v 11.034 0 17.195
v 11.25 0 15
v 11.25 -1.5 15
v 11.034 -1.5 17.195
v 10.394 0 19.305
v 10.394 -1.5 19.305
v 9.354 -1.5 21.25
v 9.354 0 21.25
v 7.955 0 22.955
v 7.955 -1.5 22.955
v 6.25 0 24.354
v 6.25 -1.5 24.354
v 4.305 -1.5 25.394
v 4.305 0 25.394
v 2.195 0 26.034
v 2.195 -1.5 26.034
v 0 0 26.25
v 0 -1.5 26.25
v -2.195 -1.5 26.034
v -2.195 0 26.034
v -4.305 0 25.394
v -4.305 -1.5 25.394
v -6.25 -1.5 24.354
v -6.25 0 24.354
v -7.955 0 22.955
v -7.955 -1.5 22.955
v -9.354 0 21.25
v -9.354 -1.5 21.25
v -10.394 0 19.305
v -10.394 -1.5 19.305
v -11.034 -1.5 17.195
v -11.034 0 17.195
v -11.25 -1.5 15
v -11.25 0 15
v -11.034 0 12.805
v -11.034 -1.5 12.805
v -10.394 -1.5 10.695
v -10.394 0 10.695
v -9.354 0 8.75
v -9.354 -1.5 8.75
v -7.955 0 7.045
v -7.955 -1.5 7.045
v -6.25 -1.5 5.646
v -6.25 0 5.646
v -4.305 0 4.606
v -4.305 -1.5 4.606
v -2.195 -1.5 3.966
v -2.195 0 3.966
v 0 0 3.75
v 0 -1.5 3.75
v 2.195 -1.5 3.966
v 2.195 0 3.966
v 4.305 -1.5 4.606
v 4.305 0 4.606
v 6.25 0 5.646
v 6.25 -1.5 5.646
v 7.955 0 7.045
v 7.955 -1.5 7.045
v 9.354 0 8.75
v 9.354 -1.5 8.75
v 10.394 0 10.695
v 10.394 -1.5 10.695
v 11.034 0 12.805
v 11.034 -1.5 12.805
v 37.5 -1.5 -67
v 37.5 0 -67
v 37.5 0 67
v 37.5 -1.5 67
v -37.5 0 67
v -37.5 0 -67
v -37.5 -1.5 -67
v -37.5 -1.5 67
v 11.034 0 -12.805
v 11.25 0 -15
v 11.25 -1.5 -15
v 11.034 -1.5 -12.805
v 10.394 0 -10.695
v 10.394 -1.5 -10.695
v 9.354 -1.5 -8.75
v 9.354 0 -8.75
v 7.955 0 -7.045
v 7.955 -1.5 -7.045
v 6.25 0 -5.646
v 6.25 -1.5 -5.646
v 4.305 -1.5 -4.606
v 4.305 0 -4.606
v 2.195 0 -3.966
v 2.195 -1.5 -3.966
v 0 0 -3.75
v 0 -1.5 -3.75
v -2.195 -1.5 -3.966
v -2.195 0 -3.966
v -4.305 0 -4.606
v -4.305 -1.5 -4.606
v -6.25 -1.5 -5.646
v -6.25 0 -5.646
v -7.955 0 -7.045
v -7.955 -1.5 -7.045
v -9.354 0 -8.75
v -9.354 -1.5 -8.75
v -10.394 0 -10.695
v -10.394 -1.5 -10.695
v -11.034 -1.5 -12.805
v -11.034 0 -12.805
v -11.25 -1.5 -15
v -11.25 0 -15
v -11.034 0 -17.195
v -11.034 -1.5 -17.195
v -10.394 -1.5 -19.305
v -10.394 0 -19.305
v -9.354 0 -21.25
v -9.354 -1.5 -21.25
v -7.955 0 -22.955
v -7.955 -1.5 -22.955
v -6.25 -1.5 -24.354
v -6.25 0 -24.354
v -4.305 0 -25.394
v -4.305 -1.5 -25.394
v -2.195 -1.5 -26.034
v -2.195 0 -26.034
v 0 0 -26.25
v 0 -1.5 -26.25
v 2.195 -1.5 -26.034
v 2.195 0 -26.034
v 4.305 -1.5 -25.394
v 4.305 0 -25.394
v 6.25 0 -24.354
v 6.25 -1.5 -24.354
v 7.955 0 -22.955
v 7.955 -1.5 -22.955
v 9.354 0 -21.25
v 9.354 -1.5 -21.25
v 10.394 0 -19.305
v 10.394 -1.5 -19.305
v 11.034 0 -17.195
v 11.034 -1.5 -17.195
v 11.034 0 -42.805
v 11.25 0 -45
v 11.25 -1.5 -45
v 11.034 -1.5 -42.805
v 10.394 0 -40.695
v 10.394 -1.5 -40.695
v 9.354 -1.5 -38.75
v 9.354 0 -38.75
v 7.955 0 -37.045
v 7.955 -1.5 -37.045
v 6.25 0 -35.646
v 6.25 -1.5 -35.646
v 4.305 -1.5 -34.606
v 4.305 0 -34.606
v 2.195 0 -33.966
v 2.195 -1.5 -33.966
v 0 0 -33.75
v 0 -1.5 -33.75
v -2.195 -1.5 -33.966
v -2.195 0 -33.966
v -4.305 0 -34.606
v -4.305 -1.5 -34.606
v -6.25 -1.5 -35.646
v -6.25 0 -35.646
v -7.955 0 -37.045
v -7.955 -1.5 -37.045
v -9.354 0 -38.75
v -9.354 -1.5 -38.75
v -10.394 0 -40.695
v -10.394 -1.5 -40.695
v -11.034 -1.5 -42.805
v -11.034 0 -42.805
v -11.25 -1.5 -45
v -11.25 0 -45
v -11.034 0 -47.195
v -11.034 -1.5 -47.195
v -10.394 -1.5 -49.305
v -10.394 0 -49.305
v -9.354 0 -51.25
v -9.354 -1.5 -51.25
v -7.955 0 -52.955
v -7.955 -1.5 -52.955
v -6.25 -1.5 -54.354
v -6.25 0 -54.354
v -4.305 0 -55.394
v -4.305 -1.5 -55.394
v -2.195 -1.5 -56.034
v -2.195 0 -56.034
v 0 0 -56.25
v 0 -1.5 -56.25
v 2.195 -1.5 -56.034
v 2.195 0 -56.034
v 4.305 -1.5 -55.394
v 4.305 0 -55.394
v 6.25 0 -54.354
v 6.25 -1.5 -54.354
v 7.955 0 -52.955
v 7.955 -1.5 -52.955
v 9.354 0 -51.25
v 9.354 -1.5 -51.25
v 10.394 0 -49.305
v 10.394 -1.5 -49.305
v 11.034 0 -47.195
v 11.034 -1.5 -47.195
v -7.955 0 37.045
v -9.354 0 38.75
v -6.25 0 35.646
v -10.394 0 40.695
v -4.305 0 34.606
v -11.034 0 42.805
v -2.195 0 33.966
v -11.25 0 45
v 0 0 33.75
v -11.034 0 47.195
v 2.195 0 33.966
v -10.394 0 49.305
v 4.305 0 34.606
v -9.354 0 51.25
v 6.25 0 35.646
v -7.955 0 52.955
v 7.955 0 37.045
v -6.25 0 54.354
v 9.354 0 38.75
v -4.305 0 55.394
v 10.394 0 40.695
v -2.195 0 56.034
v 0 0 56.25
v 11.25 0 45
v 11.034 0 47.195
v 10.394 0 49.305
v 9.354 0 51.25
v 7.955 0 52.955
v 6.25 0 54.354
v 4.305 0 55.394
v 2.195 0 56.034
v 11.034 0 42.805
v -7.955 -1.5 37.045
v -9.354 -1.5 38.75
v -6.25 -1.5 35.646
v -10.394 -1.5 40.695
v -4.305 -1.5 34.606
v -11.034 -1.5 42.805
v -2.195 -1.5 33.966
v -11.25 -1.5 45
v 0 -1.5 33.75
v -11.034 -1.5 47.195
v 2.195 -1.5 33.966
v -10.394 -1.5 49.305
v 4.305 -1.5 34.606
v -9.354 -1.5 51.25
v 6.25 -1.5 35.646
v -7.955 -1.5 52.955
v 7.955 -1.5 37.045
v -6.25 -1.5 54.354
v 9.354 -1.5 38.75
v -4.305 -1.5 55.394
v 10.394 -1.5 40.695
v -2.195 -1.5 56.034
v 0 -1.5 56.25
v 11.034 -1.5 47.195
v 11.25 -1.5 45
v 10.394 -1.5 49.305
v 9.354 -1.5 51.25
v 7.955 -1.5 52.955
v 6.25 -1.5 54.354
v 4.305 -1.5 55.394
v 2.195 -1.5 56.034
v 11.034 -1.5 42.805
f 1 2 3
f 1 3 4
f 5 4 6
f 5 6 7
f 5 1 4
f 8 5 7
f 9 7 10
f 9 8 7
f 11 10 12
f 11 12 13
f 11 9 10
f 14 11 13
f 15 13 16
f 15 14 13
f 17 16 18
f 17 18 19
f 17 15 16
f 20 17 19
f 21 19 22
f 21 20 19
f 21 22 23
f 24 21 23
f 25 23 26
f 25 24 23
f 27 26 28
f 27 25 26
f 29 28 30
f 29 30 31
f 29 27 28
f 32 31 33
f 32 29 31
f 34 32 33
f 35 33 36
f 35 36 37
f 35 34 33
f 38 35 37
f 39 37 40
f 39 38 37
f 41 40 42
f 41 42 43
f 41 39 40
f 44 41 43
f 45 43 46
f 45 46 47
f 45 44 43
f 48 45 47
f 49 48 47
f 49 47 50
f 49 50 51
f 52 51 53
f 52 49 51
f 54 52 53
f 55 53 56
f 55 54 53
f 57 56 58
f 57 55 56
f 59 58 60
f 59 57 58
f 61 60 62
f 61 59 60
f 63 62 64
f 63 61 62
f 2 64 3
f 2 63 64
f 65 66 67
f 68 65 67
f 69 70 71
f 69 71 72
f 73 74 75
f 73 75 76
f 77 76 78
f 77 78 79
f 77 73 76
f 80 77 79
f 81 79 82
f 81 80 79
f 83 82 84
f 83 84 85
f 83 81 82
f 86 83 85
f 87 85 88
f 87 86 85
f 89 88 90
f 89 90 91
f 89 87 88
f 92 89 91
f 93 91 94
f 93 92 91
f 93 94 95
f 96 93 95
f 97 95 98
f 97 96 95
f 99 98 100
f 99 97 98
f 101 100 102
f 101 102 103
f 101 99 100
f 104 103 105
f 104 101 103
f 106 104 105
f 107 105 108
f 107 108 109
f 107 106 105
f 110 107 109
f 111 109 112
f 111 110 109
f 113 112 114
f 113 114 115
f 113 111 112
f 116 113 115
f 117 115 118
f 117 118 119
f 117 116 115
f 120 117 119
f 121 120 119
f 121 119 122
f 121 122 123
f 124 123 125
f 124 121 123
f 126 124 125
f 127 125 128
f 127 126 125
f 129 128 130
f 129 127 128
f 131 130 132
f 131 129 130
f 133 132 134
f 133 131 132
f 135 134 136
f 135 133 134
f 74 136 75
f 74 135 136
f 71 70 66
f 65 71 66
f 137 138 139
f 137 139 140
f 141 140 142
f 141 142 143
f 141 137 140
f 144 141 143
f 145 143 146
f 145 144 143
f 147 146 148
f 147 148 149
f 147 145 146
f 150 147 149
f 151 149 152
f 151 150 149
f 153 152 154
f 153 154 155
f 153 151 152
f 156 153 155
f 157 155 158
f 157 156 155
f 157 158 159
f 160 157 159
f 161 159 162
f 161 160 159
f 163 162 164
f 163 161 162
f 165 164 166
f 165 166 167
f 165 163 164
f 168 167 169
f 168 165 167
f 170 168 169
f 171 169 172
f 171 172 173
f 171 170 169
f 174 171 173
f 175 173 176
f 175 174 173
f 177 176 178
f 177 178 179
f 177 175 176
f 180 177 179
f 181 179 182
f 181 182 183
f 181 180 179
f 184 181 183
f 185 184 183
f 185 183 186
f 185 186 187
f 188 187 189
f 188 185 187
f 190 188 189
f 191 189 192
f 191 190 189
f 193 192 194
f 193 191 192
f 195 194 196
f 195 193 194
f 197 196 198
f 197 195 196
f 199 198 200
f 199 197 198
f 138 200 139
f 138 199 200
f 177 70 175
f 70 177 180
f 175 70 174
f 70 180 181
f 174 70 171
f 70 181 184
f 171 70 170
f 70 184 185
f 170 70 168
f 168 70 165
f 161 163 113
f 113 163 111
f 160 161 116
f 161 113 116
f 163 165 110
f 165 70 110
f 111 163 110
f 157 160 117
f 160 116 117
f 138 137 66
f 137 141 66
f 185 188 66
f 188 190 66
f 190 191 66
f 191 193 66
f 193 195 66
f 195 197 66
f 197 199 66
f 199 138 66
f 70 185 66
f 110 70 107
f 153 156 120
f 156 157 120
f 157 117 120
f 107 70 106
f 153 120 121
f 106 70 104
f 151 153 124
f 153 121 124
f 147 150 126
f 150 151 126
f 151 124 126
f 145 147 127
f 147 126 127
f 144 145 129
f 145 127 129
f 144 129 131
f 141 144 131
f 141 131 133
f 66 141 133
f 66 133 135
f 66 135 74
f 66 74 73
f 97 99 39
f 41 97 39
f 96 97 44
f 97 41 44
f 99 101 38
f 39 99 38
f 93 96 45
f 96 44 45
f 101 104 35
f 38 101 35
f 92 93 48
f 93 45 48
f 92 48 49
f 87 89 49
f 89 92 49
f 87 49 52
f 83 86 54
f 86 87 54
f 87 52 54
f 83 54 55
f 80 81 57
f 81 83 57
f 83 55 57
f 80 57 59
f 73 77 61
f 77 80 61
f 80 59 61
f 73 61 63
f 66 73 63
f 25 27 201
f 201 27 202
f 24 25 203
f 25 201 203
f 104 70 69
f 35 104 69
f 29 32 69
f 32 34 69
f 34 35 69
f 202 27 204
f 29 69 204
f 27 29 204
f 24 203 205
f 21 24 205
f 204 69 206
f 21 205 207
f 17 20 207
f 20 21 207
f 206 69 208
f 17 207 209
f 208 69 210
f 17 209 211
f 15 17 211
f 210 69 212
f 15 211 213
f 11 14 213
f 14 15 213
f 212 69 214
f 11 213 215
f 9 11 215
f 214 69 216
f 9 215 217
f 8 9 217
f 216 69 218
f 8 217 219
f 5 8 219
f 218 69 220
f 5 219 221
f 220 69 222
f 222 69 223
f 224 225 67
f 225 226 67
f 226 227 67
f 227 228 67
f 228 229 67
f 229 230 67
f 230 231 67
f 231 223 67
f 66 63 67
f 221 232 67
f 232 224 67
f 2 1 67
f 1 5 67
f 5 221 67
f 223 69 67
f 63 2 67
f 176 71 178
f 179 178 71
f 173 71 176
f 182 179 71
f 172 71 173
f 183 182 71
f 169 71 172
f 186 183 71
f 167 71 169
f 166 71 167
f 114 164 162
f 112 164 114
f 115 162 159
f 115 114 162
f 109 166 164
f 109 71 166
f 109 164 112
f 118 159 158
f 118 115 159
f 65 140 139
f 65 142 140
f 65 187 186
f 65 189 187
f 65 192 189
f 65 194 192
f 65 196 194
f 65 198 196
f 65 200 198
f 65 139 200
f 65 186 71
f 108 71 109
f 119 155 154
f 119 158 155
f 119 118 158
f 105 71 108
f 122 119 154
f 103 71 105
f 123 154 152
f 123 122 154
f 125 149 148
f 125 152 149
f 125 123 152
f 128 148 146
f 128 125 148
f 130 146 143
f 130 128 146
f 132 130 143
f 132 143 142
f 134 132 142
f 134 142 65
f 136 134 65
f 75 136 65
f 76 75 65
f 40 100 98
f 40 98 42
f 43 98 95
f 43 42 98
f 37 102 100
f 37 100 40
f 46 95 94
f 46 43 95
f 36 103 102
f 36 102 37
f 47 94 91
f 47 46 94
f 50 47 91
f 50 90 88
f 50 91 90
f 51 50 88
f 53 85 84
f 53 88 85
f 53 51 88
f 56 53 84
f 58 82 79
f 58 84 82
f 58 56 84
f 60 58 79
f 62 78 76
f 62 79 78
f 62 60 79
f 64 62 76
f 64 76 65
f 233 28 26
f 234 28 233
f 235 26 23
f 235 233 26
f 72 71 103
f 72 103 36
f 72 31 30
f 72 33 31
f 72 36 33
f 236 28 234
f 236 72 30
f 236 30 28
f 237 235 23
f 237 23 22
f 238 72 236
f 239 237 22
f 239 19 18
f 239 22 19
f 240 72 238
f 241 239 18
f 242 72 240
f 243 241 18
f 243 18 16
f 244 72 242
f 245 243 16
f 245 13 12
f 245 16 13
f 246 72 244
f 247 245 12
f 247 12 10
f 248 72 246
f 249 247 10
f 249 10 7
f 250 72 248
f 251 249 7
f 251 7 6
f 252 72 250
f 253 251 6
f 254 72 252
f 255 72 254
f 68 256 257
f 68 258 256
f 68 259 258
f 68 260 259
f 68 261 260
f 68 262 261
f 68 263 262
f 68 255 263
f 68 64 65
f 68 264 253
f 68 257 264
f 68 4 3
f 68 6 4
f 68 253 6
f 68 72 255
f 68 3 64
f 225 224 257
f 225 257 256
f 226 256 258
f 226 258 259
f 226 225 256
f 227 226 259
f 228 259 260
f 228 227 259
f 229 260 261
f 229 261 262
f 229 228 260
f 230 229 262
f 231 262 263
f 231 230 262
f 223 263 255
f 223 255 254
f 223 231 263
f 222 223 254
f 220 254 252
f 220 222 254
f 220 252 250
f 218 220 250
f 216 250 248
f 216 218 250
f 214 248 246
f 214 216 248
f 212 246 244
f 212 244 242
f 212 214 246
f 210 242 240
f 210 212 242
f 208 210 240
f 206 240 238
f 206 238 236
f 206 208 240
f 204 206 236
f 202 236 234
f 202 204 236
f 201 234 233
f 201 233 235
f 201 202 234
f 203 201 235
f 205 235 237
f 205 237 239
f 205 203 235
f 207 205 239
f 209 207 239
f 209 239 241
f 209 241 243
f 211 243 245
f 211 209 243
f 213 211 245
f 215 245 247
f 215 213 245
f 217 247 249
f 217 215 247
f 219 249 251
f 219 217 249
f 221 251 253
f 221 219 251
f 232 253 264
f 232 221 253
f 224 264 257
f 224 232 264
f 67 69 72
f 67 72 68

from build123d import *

# Parameters (mm, degrees)
F0_W     = 75
F0_H     = 134
F0_R     = 11.25
F1_DEPTH = 1.5


with BuildPart() as f1:
    # F0 (on Front) → F1 (new body)
    with BuildSketch(Plane.XZ):
        Rectangle(F0_W, F0_H)
        with Locations((0, -45)):
            Circle(F0_R, mode=Mode.SUBTRACT)
        with Locations((0, -15)):
            Circle(F0_R, mode=Mode.SUBTRACT)
        with Locations((0, 15)):
            Circle(F0_R, mode=Mode.SUBTRACT)
        with Locations((0, 45)):
            Circle(F0_R, mode=Mode.SUBTRACT)
    extrude(amount=F1_DEPTH)


solid = f1.part
